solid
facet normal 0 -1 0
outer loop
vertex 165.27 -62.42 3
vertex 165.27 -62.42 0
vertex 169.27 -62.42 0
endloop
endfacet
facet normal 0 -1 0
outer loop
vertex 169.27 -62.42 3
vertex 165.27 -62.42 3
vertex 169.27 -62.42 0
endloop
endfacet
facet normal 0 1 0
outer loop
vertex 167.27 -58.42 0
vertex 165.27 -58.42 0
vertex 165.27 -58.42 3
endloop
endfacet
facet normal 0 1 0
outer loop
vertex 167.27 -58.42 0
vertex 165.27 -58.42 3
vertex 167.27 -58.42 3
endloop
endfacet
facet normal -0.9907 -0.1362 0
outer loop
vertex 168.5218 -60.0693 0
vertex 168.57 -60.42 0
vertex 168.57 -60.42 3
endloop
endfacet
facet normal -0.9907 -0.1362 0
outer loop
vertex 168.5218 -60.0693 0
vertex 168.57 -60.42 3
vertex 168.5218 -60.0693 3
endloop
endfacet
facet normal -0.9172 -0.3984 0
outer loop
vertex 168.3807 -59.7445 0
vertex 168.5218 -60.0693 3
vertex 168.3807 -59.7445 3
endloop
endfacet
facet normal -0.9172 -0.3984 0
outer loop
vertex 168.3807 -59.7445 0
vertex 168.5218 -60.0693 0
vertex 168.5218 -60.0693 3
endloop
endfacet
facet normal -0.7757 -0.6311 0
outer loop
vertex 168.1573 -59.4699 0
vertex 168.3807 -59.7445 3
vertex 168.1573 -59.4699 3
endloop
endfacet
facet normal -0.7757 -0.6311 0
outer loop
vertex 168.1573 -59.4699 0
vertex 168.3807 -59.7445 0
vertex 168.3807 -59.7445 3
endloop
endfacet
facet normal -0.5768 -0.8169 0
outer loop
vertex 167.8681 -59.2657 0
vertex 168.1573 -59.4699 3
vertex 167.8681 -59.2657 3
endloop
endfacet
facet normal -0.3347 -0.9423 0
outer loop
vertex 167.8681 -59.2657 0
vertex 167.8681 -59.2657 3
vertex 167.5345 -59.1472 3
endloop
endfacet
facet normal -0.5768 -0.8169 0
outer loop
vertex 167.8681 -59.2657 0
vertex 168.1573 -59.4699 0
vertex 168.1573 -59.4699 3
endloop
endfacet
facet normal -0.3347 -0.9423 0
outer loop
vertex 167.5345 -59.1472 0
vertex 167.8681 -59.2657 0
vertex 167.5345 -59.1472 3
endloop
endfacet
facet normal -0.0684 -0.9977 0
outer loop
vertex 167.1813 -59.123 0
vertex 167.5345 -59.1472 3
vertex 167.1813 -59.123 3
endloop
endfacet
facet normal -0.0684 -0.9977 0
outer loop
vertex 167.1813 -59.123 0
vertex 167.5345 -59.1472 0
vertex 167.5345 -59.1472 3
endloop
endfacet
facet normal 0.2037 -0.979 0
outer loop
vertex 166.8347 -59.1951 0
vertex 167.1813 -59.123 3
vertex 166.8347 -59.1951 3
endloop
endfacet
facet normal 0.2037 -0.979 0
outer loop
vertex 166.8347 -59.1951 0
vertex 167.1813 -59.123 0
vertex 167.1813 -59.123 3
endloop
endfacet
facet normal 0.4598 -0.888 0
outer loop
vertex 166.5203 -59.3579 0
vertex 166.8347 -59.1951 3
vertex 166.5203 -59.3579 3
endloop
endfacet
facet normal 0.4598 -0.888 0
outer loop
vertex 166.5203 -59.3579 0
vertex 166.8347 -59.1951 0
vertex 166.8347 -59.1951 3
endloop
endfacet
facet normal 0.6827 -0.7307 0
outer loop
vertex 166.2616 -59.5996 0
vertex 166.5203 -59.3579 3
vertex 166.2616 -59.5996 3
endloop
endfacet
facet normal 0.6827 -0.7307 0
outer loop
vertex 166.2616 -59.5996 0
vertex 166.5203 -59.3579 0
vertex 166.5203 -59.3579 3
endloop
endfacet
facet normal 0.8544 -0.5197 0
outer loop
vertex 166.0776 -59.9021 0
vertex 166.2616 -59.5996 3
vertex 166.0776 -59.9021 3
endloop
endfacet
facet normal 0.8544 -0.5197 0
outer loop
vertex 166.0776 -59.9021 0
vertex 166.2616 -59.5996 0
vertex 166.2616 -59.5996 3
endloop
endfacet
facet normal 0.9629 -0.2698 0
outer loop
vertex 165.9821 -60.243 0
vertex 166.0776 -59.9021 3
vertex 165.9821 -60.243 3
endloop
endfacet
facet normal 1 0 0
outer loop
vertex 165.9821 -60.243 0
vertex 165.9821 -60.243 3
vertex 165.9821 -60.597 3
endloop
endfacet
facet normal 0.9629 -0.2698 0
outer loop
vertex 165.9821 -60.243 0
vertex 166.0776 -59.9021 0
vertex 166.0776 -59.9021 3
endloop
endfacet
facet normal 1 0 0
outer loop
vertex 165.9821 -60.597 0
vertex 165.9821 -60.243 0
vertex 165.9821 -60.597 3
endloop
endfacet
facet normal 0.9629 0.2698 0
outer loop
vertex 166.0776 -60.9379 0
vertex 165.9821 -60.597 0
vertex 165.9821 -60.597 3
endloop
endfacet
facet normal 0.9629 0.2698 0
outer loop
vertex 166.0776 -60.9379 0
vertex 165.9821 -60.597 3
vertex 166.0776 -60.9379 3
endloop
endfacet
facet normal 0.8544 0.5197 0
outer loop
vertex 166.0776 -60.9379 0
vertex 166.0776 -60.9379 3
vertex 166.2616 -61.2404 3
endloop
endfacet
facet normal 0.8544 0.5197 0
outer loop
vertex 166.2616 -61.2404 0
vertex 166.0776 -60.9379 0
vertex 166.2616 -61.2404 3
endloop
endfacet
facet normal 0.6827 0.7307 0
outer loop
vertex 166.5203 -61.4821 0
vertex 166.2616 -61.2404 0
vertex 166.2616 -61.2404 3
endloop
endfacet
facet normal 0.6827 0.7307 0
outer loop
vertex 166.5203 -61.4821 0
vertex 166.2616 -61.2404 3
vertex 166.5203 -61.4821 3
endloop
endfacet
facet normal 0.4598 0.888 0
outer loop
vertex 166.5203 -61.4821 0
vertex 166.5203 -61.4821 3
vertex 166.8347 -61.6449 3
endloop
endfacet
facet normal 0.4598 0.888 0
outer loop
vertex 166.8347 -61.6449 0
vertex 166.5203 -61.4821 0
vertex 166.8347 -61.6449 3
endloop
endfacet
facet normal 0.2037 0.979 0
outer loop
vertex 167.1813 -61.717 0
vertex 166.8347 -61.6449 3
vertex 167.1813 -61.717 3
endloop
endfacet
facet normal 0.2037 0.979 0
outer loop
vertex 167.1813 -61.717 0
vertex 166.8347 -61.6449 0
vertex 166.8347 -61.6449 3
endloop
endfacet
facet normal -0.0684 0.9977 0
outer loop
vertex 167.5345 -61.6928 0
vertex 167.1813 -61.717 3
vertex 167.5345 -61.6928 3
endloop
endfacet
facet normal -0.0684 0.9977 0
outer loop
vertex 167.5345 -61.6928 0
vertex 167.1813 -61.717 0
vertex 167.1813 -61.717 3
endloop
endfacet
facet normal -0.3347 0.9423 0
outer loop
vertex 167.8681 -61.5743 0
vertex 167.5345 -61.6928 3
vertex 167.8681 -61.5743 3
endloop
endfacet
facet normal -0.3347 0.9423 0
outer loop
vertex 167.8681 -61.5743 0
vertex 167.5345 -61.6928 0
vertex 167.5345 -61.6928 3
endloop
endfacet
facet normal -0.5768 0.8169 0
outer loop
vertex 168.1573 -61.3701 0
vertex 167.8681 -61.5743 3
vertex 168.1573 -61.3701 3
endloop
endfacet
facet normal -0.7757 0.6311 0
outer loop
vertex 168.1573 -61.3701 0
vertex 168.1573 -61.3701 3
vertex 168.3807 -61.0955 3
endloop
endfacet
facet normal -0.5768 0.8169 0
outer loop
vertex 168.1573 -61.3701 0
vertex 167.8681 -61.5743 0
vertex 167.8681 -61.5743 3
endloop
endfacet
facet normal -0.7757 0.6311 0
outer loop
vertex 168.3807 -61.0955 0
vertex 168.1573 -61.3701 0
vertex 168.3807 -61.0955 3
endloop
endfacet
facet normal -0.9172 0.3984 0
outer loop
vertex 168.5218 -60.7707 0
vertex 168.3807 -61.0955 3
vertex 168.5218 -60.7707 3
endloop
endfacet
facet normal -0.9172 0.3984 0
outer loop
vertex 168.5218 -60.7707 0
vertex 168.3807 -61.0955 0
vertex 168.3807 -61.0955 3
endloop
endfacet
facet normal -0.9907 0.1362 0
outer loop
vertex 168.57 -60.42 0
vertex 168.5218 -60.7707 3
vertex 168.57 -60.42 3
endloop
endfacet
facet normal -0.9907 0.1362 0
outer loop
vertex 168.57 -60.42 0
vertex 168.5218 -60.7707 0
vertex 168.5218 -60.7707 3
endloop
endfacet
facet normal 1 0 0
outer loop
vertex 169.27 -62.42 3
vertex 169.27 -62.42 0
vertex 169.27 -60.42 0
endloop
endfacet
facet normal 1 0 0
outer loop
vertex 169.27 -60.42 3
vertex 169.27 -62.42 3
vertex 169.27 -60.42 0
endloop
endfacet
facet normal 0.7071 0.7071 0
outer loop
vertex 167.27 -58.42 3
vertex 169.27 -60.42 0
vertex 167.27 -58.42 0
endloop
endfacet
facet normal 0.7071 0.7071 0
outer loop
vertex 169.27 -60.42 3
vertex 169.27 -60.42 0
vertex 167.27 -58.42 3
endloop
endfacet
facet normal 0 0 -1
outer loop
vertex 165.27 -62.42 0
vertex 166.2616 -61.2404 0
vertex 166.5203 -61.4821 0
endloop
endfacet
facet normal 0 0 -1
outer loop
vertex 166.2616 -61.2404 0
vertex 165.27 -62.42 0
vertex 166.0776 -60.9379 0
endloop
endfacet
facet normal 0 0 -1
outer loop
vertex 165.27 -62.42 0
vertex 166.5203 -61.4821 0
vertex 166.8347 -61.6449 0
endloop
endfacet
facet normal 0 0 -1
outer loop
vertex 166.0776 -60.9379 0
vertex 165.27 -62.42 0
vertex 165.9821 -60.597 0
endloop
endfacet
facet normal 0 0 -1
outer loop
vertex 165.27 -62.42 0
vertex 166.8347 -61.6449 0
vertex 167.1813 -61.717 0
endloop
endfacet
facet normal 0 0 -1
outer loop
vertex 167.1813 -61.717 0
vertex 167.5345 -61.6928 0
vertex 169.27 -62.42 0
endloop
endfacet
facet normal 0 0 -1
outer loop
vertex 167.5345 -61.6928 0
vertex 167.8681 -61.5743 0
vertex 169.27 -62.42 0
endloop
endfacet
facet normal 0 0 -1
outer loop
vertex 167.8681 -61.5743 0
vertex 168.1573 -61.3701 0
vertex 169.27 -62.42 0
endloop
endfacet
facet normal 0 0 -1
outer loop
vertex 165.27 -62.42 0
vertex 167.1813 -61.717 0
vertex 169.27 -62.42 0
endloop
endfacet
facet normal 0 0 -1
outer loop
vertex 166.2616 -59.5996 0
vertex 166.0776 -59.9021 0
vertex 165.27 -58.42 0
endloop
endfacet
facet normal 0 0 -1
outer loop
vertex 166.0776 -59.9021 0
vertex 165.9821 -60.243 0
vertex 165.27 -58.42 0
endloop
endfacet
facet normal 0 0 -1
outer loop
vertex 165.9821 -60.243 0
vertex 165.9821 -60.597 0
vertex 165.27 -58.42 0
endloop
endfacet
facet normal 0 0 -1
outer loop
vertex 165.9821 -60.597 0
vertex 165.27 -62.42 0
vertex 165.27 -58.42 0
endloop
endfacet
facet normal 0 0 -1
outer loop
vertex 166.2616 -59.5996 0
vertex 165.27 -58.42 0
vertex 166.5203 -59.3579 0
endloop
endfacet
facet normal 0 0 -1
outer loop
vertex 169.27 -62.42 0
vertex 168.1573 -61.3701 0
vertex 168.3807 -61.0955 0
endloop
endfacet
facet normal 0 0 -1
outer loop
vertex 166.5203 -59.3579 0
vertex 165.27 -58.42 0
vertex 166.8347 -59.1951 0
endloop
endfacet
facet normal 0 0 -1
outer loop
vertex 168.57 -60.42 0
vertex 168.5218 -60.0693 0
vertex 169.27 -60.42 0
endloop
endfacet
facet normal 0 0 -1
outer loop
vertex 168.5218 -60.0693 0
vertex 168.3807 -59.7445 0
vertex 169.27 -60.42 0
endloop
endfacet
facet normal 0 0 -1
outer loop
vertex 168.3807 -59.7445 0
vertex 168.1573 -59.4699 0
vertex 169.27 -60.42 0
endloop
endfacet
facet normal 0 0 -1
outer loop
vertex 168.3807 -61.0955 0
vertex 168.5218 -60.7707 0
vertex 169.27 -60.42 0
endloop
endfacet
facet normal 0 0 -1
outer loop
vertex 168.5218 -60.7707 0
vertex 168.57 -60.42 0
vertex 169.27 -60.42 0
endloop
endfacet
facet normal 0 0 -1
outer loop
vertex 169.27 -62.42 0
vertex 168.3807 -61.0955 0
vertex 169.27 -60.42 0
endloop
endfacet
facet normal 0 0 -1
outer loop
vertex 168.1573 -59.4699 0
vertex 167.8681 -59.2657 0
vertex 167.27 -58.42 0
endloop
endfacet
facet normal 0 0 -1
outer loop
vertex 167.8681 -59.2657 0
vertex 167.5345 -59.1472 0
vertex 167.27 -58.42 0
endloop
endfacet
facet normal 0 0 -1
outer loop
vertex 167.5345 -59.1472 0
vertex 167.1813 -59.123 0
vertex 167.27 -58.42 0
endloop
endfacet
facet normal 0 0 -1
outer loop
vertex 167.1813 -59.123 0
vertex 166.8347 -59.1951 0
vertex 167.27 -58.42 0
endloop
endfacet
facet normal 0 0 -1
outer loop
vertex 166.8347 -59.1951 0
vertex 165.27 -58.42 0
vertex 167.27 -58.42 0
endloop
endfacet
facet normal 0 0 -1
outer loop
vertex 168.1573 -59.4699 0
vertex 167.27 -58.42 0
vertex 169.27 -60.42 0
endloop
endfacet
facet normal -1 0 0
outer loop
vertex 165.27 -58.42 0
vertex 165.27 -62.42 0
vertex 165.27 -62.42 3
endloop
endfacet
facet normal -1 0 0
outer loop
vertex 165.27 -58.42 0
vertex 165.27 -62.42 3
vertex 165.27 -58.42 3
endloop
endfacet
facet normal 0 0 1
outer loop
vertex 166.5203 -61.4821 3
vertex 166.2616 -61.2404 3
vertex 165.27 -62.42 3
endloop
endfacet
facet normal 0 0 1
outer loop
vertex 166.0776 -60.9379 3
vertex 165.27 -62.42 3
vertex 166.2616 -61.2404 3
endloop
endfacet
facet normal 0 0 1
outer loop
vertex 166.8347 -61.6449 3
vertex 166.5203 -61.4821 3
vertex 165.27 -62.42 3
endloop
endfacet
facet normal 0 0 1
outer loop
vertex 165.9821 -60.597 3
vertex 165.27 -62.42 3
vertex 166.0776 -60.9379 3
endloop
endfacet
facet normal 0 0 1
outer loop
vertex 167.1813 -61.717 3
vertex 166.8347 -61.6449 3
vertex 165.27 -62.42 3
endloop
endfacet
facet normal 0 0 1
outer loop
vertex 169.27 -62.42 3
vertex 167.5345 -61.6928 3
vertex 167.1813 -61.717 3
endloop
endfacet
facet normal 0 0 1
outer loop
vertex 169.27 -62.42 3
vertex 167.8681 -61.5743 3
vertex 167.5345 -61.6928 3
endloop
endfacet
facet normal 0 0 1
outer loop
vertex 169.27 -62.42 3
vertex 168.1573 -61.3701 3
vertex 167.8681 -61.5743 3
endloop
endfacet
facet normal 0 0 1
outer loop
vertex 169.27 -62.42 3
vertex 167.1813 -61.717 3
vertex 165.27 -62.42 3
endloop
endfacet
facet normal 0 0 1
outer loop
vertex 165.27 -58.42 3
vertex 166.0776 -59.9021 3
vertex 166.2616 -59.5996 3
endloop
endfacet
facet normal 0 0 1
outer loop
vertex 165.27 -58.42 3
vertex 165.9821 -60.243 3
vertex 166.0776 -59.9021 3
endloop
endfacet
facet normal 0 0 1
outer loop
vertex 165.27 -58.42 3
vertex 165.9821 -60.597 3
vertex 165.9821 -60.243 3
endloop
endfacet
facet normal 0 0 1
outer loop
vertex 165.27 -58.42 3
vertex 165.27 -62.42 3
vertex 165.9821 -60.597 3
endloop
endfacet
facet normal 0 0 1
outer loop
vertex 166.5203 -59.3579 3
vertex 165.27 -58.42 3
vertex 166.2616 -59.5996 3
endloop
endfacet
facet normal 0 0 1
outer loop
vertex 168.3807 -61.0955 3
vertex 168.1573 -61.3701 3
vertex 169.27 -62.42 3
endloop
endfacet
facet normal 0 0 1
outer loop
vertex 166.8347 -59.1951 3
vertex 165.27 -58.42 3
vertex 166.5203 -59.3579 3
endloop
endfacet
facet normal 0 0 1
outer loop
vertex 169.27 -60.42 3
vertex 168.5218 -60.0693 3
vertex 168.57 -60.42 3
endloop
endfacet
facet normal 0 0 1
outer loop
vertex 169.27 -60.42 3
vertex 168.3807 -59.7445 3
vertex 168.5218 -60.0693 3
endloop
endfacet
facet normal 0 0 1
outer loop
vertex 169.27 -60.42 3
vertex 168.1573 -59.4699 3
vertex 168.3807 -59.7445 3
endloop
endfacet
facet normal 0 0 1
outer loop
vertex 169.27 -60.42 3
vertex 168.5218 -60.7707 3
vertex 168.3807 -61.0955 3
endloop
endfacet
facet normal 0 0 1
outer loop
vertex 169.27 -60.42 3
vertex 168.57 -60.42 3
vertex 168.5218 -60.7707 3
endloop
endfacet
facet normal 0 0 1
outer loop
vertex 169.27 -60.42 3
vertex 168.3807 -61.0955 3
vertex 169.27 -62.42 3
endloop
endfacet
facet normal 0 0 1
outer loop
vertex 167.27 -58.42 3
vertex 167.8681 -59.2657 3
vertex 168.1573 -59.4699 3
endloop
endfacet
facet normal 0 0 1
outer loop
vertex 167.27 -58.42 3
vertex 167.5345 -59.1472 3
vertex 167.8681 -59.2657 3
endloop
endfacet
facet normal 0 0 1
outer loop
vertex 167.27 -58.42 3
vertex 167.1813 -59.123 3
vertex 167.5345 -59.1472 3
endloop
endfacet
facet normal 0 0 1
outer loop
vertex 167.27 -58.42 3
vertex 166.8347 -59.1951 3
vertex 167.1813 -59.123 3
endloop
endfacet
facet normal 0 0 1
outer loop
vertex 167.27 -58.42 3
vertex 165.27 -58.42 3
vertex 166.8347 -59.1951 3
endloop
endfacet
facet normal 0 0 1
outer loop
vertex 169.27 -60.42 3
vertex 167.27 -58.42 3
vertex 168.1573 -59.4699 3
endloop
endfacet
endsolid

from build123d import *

# Parameters (mm, degrees)
SKETCH1_W           = 4
SKETCH1_H           = 4
SKETCH1_R           = 1.3
BOSS_EXTRUDE1_DEPTH = 3
CHAMFER1_SIZE       = 2


with BuildPart() as part:
    # Sketch1 → Boss-Extrude1 (new body)
    with BuildSketch(Plane.XY):
        with Locations((167.269999999, -60.420000001)):
            Rectangle(SKETCH1_W, SKETCH1_H)
        with Locations((167.269999999, -60.420000001)):
            Circle(SKETCH1_R, mode=Mode.SUBTRACT)
    extrude(amount=BOSS_EXTRUDE1_DEPTH)

    # Chamfer1
    chamfer1_edges = [part.edges().sort_by_distance(p)[0] for p in [
        (169.269999999, -58.420000001, 1.5),
    ]]
    chamfer(chamfer1_edges, length=CHAMFER1_SIZE)


solid = part.part
